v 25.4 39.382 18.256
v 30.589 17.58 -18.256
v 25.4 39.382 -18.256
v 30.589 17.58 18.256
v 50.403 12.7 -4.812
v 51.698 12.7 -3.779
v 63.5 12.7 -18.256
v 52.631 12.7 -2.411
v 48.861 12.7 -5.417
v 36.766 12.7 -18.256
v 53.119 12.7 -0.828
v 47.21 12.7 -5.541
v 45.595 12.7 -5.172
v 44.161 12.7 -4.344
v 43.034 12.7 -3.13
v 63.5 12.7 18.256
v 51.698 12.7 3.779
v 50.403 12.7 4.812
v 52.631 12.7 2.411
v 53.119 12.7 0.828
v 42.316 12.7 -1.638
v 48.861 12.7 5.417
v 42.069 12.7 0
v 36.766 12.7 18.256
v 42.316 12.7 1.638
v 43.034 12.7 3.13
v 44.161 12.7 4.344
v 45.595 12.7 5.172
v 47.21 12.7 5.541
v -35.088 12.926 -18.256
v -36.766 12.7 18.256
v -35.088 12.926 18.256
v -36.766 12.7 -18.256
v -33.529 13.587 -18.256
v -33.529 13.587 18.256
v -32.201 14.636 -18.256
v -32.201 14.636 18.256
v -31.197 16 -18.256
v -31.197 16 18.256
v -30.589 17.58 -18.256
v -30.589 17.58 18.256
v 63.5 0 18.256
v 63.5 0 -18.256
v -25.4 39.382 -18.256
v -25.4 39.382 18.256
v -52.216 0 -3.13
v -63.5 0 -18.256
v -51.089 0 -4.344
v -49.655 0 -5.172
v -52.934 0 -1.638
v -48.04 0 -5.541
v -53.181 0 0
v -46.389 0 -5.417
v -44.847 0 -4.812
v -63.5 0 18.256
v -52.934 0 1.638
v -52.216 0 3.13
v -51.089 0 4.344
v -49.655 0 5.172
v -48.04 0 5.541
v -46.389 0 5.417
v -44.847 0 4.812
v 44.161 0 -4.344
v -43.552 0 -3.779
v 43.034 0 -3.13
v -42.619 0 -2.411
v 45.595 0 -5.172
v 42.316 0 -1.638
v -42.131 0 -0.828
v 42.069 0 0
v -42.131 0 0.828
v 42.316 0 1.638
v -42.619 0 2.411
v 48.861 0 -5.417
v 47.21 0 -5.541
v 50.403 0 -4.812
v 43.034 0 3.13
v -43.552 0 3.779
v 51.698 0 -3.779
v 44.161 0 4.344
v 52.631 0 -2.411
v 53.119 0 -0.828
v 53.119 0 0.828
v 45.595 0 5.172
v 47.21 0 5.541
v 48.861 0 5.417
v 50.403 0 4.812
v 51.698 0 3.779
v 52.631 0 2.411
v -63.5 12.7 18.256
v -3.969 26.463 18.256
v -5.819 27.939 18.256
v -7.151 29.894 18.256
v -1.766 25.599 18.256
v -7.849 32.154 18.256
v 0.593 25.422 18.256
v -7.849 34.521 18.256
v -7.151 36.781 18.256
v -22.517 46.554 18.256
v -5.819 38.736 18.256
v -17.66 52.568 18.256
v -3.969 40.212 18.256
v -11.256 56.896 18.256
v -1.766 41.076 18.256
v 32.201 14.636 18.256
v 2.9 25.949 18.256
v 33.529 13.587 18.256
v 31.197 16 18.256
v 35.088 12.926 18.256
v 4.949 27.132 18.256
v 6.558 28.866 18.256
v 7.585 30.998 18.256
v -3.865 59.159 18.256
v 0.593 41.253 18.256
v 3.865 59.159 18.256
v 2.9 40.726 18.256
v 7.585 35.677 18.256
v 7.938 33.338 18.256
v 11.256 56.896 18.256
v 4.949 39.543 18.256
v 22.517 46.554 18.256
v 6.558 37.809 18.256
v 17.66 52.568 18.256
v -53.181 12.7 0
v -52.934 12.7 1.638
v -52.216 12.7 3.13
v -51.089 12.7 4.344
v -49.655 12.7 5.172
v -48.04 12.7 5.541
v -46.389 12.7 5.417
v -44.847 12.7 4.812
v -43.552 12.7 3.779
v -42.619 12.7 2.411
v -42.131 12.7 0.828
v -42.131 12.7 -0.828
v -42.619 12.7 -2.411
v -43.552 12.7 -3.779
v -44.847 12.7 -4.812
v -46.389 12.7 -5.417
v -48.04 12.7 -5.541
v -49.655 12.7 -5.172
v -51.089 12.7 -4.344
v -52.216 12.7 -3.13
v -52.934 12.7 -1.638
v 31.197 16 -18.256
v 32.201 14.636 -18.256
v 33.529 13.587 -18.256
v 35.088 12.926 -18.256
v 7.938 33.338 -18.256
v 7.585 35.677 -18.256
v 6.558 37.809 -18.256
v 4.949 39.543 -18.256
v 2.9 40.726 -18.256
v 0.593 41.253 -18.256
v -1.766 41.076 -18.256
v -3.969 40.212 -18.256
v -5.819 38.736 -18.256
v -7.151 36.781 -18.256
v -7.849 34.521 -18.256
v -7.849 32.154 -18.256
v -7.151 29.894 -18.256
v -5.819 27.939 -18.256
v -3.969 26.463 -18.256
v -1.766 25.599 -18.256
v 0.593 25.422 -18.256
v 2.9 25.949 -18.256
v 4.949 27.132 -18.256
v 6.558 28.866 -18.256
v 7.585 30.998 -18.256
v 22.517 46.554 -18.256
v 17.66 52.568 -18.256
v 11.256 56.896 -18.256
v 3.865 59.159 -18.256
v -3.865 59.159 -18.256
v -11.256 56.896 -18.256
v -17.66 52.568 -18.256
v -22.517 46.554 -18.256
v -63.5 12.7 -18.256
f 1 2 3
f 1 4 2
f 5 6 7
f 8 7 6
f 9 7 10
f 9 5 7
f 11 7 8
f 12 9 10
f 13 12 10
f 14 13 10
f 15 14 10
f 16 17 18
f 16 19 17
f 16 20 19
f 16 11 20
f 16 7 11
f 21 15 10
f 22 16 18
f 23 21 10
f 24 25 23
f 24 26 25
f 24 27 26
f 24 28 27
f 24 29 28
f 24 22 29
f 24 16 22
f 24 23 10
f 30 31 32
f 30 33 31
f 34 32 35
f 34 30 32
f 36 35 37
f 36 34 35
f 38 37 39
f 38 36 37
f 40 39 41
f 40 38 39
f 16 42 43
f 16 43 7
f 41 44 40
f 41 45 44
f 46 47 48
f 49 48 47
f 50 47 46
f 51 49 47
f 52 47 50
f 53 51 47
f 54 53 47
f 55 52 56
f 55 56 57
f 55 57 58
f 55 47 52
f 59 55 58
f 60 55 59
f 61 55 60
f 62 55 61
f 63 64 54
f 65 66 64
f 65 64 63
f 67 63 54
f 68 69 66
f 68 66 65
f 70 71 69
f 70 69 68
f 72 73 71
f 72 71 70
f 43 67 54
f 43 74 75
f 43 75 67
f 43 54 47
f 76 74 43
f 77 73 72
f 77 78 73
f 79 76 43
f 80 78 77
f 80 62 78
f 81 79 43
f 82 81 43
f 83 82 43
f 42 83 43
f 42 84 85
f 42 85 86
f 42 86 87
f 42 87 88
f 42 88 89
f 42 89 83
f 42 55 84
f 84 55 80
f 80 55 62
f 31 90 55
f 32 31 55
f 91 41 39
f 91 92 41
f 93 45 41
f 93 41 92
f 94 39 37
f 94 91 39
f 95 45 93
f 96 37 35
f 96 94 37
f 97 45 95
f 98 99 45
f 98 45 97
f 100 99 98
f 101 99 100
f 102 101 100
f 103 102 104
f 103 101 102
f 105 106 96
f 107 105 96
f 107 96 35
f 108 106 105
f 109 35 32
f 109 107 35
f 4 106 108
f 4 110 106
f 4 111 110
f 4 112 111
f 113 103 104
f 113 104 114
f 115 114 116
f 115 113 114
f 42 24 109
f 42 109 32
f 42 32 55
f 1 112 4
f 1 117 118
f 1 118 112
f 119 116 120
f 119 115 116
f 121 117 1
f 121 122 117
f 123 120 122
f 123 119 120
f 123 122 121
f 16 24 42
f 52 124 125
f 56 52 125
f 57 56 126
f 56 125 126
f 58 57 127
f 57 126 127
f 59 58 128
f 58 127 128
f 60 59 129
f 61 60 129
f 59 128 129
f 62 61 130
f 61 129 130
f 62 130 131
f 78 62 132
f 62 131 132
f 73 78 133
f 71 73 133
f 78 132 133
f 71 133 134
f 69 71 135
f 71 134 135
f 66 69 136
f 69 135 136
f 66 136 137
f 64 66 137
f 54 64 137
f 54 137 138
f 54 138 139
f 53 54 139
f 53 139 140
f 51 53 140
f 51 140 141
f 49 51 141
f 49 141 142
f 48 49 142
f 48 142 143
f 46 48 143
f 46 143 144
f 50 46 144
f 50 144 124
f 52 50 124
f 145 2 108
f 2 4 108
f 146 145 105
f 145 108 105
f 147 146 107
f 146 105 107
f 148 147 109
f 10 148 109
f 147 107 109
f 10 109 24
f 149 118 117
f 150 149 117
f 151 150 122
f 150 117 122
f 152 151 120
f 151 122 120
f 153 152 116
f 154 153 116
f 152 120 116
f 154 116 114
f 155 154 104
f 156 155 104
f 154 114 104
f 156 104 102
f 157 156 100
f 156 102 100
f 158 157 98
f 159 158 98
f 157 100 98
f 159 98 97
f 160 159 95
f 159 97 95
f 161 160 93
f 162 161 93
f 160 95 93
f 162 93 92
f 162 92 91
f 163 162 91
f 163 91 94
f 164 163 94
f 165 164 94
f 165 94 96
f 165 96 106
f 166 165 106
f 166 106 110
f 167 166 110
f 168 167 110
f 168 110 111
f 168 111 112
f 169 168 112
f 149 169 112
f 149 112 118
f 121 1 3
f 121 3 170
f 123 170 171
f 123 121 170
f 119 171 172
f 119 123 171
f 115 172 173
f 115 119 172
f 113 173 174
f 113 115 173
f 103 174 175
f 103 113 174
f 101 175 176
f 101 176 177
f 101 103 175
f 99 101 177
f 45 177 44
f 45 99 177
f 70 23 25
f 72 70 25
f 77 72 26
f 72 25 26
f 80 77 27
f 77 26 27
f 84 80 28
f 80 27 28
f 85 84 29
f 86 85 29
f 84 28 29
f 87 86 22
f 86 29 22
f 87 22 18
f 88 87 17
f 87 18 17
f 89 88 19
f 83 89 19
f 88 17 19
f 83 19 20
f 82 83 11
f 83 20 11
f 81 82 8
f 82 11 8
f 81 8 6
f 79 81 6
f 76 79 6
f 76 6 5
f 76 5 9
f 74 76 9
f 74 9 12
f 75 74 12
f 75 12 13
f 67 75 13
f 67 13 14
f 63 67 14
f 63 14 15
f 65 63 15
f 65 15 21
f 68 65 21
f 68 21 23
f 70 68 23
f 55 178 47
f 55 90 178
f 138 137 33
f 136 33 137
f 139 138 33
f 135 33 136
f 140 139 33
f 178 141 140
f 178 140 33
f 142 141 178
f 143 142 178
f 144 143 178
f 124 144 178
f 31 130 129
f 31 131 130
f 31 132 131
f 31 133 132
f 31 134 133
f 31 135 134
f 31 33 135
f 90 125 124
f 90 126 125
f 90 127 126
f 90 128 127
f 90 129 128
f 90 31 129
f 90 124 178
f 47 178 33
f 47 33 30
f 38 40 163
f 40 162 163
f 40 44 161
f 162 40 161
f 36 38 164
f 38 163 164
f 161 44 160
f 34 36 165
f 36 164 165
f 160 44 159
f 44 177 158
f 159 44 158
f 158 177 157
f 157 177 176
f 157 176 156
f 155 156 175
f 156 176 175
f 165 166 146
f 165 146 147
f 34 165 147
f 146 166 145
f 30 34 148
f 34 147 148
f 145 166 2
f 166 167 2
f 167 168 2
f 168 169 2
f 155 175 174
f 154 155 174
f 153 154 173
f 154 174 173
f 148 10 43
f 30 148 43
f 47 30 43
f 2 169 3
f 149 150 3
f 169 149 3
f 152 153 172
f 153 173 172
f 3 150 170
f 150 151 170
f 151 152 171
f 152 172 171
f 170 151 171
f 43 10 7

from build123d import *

# Parameters (mm, degrees)
EXTRUDE1_DEPTH     = 18.25625
FILLET1_R          = 6.35
SKETCH3_R          = 7.9375
CUT_EXTRUDE1_DEPTH = 37.5125
SKETCH4_R          = 5.55625
CUT_EXTRUDE2_DEPTH = 13.7


with BuildPart() as part:
    # Sketch1 → Extrude1 (new body, symmetric)
    with BuildSketch(Plane.XY):
        with BuildLine():
            Line((-63.5, 0), (63.5, 0))
            Line((63.5, 0), (63.5, 12.7))
            Line((63.5, 12.7), (31.75, 12.7))
            Line((31.75, 12.7), (25.4, 39.382325452))
            ThreePointArc((25.4, 39.382325452), (0, 59.446883653), (-25.4, 39.382325452))
            Line((-25.4, 39.382325452), (-31.75, 12.7))
            Line((-31.75, 12.7), (-63.5, 12.7))
            Line((-63.5, 12.7), (-63.5, 0))
        make_face()
    extrude(amount=EXTRUDE1_DEPTH, both=True)

    # Fillet1
    fillet1_edges = [part.edges().sort_by_distance(p)[0] for p in [
        (-31.75, 12.7, 0),
        (31.75, 12.7, 0),
    ]]
    fillet(fillet1_edges, radius=FILLET1_R)

    # Sketch3 → Cut-Extrude1 (cut, through all)
    with BuildSketch(Plane.XY.offset(18.25625)):
        with Locations((0, 33.3375)):
            Circle(SKETCH3_R)
    extrude(amount=-CUT_EXTRUDE1_DEPTH, mode=Mode.SUBTRACT)

    # Sketch4 → Cut-Extrude2 (cut, through all)
    with BuildSketch(Plane(origin=(0, 12.7, 0), x_dir=(-1, 0, 0), z_dir=(0, 1, 0))):
        with Locations((-47.625, 0)):
            Circle(SKETCH4_R)
        with Locations((47.625, 0)):
            Circle(SKETCH4_R)
    extrude(amount=-CUT_EXTRUDE2_DEPTH, mode=Mode.SUBTRACT)


solid = part.part
